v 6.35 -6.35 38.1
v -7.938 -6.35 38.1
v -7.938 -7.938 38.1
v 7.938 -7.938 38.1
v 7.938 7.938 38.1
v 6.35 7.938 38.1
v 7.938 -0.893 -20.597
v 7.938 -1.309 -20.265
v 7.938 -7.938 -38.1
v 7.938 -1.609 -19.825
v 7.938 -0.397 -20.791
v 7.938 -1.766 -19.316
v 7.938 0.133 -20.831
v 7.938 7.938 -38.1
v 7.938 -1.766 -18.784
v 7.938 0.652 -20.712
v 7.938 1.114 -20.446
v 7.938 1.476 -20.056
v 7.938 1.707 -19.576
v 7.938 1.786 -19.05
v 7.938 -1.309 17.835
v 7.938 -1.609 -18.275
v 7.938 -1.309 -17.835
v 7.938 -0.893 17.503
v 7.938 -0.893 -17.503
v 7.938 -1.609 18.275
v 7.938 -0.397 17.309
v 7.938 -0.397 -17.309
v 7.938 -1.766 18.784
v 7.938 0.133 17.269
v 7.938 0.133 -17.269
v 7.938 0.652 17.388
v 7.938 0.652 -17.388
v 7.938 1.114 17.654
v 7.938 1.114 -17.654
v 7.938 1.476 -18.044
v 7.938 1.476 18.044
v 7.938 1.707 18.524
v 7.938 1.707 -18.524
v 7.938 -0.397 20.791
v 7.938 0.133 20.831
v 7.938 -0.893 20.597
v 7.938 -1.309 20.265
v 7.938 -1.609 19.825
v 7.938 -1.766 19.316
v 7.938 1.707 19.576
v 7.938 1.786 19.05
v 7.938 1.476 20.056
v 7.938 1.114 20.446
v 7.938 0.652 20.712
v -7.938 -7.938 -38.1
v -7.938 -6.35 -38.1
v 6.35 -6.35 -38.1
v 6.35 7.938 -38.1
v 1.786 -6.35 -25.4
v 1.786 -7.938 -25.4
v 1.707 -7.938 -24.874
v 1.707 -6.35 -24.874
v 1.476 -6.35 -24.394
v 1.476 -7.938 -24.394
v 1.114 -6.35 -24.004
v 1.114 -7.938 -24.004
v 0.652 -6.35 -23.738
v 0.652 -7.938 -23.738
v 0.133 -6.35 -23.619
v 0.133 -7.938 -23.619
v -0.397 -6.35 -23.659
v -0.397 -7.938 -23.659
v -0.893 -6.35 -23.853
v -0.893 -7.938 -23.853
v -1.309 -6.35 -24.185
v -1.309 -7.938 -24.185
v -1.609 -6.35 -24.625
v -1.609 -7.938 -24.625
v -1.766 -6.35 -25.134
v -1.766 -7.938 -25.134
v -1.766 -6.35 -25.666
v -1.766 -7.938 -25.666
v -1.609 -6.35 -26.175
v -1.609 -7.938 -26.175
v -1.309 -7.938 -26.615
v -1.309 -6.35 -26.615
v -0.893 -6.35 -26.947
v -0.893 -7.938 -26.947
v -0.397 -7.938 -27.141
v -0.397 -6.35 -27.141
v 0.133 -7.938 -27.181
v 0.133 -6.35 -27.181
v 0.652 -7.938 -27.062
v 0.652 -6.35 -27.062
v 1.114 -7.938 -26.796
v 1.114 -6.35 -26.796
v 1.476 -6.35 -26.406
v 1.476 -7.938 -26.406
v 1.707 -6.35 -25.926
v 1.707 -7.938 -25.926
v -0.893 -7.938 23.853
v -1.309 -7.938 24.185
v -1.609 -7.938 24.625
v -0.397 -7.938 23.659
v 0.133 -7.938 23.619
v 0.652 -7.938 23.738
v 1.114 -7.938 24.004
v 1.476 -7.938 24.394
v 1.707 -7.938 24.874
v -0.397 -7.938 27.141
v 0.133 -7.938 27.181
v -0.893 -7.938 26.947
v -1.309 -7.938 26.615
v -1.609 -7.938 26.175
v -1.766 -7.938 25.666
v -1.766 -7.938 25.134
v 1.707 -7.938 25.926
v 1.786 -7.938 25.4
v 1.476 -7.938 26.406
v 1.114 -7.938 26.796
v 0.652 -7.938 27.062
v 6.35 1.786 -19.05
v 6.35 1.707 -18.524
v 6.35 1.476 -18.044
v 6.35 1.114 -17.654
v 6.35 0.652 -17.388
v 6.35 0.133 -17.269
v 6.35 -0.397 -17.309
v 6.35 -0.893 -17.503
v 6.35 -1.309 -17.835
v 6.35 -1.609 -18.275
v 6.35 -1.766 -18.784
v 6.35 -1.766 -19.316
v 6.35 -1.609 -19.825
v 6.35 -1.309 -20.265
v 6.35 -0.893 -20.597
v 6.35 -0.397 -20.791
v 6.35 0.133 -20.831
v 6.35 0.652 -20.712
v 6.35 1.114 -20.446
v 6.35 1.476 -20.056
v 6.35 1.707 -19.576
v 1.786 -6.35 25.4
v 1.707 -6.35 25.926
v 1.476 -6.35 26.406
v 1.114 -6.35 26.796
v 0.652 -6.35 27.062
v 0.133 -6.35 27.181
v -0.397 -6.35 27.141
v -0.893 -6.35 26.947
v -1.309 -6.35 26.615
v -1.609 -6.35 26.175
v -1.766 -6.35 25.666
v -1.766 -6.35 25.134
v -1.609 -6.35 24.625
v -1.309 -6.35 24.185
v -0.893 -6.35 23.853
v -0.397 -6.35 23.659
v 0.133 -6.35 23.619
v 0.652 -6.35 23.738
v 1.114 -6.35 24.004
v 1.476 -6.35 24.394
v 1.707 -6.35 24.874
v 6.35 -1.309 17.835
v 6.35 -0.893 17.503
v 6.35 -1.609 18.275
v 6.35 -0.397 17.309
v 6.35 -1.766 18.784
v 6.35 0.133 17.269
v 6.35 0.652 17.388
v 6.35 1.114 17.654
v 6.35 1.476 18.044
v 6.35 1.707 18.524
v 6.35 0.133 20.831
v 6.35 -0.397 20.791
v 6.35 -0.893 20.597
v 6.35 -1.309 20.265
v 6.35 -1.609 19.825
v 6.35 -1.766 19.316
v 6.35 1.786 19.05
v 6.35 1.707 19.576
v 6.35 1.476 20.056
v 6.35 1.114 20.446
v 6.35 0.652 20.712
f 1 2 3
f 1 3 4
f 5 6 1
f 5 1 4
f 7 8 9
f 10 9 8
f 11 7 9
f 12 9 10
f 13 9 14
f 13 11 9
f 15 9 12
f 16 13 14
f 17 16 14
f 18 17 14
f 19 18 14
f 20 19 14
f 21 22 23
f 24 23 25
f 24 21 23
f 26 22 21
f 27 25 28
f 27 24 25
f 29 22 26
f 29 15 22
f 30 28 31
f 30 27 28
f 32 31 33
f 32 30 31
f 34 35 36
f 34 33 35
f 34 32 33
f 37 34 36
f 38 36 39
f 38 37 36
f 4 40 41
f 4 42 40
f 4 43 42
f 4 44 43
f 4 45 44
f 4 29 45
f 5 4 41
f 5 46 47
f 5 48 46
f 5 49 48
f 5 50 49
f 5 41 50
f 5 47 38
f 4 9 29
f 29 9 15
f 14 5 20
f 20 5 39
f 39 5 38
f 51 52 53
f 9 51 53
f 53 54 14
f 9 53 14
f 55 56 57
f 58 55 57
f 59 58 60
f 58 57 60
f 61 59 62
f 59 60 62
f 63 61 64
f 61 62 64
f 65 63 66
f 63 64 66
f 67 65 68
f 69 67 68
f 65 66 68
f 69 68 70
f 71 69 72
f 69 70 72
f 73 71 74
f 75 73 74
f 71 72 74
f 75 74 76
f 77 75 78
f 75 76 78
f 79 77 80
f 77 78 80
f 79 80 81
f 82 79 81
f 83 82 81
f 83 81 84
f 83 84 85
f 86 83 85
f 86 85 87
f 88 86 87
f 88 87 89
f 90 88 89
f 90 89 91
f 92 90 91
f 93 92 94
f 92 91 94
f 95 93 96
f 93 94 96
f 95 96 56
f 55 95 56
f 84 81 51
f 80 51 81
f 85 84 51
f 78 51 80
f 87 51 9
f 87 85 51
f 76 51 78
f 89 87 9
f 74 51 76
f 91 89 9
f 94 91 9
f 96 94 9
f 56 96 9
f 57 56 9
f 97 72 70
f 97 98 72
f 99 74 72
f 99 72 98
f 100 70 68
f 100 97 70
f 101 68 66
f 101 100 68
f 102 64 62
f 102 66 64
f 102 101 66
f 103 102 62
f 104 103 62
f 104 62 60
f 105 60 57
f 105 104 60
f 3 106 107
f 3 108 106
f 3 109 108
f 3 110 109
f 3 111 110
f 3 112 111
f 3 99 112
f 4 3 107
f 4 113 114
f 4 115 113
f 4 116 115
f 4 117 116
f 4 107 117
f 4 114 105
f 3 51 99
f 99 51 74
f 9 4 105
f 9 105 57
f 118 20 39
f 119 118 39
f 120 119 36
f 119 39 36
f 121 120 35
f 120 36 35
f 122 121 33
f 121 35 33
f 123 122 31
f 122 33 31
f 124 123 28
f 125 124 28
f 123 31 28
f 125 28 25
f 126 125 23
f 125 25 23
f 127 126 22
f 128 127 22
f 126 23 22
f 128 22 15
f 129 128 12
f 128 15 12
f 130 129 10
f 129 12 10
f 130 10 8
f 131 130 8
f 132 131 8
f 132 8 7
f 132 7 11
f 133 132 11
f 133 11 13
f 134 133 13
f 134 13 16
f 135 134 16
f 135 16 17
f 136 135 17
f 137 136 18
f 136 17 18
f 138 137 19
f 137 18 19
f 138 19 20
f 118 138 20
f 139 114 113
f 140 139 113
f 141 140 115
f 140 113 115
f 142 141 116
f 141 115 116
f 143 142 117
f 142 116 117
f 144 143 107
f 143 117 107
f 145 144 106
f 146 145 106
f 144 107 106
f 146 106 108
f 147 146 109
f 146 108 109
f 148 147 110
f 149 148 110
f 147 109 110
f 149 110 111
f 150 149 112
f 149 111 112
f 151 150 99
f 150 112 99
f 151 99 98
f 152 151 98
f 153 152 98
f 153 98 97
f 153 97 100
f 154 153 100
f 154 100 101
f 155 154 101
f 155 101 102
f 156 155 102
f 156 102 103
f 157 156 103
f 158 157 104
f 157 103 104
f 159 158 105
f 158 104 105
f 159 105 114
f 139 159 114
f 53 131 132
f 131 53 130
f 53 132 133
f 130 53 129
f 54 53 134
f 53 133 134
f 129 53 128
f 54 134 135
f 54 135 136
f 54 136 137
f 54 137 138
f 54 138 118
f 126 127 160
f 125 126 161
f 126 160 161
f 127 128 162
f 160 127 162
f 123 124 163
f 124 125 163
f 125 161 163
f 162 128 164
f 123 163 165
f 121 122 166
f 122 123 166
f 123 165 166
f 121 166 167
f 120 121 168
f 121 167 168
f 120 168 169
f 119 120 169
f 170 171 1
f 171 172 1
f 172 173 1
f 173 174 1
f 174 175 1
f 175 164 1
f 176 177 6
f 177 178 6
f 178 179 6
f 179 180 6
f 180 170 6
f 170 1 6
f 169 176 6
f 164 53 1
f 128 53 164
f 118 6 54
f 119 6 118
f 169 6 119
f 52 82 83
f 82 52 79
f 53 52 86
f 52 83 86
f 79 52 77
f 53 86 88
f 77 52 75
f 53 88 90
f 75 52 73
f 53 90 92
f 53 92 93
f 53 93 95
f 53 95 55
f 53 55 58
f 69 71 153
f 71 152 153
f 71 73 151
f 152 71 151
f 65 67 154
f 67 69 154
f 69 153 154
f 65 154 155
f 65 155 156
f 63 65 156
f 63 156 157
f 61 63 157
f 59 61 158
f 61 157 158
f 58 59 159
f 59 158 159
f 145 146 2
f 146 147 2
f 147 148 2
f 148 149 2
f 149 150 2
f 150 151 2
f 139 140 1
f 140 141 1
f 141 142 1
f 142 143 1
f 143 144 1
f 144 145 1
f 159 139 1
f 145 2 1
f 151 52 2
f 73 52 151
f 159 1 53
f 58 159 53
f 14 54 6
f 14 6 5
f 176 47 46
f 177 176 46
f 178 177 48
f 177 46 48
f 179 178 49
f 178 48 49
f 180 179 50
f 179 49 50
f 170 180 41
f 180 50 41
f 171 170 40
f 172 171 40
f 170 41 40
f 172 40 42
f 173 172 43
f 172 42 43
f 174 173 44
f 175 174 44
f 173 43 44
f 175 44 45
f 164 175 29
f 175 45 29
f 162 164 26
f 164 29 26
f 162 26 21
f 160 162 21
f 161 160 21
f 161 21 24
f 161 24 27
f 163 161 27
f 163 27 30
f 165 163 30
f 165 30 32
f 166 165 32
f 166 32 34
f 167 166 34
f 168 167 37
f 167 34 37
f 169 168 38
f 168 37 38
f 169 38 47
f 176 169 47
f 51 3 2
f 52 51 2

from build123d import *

# Parameters (mm, degrees)
F0_W     = 15.875
F0_H     = 15.875
F1_DEPTH = 38.1
F2_W     = 14.2875
F2_H     = 14.2875
F3_DEPTH = 76.2
F4_R     = 1.7859375
F5_DEPTH = 1.5875
F6_R     = 1.7859375
F7_DEPTH = 1.5875


with BuildPart() as f1:
    # F0 (on Top) → F1 (new body, symmetric)
    with BuildSketch(Plane.XY):
        Rectangle(F0_W, F0_H)
    extrude(amount=F1_DEPTH, both=True)

    # F2 (on face) → F3 (cut)
    with BuildSketch(Plane.XY.offset(38.1)):
        with Locations((-0.79375, 0.79375)):
            Rectangle(F2_W, F2_H)
    extrude(amount=-F3_DEPTH, mode=Mode.SUBTRACT)

    # F4 (on face) → F5 (cut, through all)
    with BuildSketch(Plane.XZ.offset(7.9375)):
        with Locations((0, -25.4)):
            Circle(F4_R)
        with Locations((0, 25.4)):
            Circle(F4_R)
    extrude(amount=-F5_DEPTH, mode=Mode.SUBTRACT)

    # F6 (on face) → F7 (cut, through all)
    with BuildSketch(Plane.YZ.offset(7.9375)):
        with Locations((0, -19.05)):
            Circle(F6_R)
        with Locations((0, 19.05)):
            Circle(F6_R)
    extrude(amount=-F7_DEPTH, mode=Mode.SUBTRACT)


solid = f1.part
